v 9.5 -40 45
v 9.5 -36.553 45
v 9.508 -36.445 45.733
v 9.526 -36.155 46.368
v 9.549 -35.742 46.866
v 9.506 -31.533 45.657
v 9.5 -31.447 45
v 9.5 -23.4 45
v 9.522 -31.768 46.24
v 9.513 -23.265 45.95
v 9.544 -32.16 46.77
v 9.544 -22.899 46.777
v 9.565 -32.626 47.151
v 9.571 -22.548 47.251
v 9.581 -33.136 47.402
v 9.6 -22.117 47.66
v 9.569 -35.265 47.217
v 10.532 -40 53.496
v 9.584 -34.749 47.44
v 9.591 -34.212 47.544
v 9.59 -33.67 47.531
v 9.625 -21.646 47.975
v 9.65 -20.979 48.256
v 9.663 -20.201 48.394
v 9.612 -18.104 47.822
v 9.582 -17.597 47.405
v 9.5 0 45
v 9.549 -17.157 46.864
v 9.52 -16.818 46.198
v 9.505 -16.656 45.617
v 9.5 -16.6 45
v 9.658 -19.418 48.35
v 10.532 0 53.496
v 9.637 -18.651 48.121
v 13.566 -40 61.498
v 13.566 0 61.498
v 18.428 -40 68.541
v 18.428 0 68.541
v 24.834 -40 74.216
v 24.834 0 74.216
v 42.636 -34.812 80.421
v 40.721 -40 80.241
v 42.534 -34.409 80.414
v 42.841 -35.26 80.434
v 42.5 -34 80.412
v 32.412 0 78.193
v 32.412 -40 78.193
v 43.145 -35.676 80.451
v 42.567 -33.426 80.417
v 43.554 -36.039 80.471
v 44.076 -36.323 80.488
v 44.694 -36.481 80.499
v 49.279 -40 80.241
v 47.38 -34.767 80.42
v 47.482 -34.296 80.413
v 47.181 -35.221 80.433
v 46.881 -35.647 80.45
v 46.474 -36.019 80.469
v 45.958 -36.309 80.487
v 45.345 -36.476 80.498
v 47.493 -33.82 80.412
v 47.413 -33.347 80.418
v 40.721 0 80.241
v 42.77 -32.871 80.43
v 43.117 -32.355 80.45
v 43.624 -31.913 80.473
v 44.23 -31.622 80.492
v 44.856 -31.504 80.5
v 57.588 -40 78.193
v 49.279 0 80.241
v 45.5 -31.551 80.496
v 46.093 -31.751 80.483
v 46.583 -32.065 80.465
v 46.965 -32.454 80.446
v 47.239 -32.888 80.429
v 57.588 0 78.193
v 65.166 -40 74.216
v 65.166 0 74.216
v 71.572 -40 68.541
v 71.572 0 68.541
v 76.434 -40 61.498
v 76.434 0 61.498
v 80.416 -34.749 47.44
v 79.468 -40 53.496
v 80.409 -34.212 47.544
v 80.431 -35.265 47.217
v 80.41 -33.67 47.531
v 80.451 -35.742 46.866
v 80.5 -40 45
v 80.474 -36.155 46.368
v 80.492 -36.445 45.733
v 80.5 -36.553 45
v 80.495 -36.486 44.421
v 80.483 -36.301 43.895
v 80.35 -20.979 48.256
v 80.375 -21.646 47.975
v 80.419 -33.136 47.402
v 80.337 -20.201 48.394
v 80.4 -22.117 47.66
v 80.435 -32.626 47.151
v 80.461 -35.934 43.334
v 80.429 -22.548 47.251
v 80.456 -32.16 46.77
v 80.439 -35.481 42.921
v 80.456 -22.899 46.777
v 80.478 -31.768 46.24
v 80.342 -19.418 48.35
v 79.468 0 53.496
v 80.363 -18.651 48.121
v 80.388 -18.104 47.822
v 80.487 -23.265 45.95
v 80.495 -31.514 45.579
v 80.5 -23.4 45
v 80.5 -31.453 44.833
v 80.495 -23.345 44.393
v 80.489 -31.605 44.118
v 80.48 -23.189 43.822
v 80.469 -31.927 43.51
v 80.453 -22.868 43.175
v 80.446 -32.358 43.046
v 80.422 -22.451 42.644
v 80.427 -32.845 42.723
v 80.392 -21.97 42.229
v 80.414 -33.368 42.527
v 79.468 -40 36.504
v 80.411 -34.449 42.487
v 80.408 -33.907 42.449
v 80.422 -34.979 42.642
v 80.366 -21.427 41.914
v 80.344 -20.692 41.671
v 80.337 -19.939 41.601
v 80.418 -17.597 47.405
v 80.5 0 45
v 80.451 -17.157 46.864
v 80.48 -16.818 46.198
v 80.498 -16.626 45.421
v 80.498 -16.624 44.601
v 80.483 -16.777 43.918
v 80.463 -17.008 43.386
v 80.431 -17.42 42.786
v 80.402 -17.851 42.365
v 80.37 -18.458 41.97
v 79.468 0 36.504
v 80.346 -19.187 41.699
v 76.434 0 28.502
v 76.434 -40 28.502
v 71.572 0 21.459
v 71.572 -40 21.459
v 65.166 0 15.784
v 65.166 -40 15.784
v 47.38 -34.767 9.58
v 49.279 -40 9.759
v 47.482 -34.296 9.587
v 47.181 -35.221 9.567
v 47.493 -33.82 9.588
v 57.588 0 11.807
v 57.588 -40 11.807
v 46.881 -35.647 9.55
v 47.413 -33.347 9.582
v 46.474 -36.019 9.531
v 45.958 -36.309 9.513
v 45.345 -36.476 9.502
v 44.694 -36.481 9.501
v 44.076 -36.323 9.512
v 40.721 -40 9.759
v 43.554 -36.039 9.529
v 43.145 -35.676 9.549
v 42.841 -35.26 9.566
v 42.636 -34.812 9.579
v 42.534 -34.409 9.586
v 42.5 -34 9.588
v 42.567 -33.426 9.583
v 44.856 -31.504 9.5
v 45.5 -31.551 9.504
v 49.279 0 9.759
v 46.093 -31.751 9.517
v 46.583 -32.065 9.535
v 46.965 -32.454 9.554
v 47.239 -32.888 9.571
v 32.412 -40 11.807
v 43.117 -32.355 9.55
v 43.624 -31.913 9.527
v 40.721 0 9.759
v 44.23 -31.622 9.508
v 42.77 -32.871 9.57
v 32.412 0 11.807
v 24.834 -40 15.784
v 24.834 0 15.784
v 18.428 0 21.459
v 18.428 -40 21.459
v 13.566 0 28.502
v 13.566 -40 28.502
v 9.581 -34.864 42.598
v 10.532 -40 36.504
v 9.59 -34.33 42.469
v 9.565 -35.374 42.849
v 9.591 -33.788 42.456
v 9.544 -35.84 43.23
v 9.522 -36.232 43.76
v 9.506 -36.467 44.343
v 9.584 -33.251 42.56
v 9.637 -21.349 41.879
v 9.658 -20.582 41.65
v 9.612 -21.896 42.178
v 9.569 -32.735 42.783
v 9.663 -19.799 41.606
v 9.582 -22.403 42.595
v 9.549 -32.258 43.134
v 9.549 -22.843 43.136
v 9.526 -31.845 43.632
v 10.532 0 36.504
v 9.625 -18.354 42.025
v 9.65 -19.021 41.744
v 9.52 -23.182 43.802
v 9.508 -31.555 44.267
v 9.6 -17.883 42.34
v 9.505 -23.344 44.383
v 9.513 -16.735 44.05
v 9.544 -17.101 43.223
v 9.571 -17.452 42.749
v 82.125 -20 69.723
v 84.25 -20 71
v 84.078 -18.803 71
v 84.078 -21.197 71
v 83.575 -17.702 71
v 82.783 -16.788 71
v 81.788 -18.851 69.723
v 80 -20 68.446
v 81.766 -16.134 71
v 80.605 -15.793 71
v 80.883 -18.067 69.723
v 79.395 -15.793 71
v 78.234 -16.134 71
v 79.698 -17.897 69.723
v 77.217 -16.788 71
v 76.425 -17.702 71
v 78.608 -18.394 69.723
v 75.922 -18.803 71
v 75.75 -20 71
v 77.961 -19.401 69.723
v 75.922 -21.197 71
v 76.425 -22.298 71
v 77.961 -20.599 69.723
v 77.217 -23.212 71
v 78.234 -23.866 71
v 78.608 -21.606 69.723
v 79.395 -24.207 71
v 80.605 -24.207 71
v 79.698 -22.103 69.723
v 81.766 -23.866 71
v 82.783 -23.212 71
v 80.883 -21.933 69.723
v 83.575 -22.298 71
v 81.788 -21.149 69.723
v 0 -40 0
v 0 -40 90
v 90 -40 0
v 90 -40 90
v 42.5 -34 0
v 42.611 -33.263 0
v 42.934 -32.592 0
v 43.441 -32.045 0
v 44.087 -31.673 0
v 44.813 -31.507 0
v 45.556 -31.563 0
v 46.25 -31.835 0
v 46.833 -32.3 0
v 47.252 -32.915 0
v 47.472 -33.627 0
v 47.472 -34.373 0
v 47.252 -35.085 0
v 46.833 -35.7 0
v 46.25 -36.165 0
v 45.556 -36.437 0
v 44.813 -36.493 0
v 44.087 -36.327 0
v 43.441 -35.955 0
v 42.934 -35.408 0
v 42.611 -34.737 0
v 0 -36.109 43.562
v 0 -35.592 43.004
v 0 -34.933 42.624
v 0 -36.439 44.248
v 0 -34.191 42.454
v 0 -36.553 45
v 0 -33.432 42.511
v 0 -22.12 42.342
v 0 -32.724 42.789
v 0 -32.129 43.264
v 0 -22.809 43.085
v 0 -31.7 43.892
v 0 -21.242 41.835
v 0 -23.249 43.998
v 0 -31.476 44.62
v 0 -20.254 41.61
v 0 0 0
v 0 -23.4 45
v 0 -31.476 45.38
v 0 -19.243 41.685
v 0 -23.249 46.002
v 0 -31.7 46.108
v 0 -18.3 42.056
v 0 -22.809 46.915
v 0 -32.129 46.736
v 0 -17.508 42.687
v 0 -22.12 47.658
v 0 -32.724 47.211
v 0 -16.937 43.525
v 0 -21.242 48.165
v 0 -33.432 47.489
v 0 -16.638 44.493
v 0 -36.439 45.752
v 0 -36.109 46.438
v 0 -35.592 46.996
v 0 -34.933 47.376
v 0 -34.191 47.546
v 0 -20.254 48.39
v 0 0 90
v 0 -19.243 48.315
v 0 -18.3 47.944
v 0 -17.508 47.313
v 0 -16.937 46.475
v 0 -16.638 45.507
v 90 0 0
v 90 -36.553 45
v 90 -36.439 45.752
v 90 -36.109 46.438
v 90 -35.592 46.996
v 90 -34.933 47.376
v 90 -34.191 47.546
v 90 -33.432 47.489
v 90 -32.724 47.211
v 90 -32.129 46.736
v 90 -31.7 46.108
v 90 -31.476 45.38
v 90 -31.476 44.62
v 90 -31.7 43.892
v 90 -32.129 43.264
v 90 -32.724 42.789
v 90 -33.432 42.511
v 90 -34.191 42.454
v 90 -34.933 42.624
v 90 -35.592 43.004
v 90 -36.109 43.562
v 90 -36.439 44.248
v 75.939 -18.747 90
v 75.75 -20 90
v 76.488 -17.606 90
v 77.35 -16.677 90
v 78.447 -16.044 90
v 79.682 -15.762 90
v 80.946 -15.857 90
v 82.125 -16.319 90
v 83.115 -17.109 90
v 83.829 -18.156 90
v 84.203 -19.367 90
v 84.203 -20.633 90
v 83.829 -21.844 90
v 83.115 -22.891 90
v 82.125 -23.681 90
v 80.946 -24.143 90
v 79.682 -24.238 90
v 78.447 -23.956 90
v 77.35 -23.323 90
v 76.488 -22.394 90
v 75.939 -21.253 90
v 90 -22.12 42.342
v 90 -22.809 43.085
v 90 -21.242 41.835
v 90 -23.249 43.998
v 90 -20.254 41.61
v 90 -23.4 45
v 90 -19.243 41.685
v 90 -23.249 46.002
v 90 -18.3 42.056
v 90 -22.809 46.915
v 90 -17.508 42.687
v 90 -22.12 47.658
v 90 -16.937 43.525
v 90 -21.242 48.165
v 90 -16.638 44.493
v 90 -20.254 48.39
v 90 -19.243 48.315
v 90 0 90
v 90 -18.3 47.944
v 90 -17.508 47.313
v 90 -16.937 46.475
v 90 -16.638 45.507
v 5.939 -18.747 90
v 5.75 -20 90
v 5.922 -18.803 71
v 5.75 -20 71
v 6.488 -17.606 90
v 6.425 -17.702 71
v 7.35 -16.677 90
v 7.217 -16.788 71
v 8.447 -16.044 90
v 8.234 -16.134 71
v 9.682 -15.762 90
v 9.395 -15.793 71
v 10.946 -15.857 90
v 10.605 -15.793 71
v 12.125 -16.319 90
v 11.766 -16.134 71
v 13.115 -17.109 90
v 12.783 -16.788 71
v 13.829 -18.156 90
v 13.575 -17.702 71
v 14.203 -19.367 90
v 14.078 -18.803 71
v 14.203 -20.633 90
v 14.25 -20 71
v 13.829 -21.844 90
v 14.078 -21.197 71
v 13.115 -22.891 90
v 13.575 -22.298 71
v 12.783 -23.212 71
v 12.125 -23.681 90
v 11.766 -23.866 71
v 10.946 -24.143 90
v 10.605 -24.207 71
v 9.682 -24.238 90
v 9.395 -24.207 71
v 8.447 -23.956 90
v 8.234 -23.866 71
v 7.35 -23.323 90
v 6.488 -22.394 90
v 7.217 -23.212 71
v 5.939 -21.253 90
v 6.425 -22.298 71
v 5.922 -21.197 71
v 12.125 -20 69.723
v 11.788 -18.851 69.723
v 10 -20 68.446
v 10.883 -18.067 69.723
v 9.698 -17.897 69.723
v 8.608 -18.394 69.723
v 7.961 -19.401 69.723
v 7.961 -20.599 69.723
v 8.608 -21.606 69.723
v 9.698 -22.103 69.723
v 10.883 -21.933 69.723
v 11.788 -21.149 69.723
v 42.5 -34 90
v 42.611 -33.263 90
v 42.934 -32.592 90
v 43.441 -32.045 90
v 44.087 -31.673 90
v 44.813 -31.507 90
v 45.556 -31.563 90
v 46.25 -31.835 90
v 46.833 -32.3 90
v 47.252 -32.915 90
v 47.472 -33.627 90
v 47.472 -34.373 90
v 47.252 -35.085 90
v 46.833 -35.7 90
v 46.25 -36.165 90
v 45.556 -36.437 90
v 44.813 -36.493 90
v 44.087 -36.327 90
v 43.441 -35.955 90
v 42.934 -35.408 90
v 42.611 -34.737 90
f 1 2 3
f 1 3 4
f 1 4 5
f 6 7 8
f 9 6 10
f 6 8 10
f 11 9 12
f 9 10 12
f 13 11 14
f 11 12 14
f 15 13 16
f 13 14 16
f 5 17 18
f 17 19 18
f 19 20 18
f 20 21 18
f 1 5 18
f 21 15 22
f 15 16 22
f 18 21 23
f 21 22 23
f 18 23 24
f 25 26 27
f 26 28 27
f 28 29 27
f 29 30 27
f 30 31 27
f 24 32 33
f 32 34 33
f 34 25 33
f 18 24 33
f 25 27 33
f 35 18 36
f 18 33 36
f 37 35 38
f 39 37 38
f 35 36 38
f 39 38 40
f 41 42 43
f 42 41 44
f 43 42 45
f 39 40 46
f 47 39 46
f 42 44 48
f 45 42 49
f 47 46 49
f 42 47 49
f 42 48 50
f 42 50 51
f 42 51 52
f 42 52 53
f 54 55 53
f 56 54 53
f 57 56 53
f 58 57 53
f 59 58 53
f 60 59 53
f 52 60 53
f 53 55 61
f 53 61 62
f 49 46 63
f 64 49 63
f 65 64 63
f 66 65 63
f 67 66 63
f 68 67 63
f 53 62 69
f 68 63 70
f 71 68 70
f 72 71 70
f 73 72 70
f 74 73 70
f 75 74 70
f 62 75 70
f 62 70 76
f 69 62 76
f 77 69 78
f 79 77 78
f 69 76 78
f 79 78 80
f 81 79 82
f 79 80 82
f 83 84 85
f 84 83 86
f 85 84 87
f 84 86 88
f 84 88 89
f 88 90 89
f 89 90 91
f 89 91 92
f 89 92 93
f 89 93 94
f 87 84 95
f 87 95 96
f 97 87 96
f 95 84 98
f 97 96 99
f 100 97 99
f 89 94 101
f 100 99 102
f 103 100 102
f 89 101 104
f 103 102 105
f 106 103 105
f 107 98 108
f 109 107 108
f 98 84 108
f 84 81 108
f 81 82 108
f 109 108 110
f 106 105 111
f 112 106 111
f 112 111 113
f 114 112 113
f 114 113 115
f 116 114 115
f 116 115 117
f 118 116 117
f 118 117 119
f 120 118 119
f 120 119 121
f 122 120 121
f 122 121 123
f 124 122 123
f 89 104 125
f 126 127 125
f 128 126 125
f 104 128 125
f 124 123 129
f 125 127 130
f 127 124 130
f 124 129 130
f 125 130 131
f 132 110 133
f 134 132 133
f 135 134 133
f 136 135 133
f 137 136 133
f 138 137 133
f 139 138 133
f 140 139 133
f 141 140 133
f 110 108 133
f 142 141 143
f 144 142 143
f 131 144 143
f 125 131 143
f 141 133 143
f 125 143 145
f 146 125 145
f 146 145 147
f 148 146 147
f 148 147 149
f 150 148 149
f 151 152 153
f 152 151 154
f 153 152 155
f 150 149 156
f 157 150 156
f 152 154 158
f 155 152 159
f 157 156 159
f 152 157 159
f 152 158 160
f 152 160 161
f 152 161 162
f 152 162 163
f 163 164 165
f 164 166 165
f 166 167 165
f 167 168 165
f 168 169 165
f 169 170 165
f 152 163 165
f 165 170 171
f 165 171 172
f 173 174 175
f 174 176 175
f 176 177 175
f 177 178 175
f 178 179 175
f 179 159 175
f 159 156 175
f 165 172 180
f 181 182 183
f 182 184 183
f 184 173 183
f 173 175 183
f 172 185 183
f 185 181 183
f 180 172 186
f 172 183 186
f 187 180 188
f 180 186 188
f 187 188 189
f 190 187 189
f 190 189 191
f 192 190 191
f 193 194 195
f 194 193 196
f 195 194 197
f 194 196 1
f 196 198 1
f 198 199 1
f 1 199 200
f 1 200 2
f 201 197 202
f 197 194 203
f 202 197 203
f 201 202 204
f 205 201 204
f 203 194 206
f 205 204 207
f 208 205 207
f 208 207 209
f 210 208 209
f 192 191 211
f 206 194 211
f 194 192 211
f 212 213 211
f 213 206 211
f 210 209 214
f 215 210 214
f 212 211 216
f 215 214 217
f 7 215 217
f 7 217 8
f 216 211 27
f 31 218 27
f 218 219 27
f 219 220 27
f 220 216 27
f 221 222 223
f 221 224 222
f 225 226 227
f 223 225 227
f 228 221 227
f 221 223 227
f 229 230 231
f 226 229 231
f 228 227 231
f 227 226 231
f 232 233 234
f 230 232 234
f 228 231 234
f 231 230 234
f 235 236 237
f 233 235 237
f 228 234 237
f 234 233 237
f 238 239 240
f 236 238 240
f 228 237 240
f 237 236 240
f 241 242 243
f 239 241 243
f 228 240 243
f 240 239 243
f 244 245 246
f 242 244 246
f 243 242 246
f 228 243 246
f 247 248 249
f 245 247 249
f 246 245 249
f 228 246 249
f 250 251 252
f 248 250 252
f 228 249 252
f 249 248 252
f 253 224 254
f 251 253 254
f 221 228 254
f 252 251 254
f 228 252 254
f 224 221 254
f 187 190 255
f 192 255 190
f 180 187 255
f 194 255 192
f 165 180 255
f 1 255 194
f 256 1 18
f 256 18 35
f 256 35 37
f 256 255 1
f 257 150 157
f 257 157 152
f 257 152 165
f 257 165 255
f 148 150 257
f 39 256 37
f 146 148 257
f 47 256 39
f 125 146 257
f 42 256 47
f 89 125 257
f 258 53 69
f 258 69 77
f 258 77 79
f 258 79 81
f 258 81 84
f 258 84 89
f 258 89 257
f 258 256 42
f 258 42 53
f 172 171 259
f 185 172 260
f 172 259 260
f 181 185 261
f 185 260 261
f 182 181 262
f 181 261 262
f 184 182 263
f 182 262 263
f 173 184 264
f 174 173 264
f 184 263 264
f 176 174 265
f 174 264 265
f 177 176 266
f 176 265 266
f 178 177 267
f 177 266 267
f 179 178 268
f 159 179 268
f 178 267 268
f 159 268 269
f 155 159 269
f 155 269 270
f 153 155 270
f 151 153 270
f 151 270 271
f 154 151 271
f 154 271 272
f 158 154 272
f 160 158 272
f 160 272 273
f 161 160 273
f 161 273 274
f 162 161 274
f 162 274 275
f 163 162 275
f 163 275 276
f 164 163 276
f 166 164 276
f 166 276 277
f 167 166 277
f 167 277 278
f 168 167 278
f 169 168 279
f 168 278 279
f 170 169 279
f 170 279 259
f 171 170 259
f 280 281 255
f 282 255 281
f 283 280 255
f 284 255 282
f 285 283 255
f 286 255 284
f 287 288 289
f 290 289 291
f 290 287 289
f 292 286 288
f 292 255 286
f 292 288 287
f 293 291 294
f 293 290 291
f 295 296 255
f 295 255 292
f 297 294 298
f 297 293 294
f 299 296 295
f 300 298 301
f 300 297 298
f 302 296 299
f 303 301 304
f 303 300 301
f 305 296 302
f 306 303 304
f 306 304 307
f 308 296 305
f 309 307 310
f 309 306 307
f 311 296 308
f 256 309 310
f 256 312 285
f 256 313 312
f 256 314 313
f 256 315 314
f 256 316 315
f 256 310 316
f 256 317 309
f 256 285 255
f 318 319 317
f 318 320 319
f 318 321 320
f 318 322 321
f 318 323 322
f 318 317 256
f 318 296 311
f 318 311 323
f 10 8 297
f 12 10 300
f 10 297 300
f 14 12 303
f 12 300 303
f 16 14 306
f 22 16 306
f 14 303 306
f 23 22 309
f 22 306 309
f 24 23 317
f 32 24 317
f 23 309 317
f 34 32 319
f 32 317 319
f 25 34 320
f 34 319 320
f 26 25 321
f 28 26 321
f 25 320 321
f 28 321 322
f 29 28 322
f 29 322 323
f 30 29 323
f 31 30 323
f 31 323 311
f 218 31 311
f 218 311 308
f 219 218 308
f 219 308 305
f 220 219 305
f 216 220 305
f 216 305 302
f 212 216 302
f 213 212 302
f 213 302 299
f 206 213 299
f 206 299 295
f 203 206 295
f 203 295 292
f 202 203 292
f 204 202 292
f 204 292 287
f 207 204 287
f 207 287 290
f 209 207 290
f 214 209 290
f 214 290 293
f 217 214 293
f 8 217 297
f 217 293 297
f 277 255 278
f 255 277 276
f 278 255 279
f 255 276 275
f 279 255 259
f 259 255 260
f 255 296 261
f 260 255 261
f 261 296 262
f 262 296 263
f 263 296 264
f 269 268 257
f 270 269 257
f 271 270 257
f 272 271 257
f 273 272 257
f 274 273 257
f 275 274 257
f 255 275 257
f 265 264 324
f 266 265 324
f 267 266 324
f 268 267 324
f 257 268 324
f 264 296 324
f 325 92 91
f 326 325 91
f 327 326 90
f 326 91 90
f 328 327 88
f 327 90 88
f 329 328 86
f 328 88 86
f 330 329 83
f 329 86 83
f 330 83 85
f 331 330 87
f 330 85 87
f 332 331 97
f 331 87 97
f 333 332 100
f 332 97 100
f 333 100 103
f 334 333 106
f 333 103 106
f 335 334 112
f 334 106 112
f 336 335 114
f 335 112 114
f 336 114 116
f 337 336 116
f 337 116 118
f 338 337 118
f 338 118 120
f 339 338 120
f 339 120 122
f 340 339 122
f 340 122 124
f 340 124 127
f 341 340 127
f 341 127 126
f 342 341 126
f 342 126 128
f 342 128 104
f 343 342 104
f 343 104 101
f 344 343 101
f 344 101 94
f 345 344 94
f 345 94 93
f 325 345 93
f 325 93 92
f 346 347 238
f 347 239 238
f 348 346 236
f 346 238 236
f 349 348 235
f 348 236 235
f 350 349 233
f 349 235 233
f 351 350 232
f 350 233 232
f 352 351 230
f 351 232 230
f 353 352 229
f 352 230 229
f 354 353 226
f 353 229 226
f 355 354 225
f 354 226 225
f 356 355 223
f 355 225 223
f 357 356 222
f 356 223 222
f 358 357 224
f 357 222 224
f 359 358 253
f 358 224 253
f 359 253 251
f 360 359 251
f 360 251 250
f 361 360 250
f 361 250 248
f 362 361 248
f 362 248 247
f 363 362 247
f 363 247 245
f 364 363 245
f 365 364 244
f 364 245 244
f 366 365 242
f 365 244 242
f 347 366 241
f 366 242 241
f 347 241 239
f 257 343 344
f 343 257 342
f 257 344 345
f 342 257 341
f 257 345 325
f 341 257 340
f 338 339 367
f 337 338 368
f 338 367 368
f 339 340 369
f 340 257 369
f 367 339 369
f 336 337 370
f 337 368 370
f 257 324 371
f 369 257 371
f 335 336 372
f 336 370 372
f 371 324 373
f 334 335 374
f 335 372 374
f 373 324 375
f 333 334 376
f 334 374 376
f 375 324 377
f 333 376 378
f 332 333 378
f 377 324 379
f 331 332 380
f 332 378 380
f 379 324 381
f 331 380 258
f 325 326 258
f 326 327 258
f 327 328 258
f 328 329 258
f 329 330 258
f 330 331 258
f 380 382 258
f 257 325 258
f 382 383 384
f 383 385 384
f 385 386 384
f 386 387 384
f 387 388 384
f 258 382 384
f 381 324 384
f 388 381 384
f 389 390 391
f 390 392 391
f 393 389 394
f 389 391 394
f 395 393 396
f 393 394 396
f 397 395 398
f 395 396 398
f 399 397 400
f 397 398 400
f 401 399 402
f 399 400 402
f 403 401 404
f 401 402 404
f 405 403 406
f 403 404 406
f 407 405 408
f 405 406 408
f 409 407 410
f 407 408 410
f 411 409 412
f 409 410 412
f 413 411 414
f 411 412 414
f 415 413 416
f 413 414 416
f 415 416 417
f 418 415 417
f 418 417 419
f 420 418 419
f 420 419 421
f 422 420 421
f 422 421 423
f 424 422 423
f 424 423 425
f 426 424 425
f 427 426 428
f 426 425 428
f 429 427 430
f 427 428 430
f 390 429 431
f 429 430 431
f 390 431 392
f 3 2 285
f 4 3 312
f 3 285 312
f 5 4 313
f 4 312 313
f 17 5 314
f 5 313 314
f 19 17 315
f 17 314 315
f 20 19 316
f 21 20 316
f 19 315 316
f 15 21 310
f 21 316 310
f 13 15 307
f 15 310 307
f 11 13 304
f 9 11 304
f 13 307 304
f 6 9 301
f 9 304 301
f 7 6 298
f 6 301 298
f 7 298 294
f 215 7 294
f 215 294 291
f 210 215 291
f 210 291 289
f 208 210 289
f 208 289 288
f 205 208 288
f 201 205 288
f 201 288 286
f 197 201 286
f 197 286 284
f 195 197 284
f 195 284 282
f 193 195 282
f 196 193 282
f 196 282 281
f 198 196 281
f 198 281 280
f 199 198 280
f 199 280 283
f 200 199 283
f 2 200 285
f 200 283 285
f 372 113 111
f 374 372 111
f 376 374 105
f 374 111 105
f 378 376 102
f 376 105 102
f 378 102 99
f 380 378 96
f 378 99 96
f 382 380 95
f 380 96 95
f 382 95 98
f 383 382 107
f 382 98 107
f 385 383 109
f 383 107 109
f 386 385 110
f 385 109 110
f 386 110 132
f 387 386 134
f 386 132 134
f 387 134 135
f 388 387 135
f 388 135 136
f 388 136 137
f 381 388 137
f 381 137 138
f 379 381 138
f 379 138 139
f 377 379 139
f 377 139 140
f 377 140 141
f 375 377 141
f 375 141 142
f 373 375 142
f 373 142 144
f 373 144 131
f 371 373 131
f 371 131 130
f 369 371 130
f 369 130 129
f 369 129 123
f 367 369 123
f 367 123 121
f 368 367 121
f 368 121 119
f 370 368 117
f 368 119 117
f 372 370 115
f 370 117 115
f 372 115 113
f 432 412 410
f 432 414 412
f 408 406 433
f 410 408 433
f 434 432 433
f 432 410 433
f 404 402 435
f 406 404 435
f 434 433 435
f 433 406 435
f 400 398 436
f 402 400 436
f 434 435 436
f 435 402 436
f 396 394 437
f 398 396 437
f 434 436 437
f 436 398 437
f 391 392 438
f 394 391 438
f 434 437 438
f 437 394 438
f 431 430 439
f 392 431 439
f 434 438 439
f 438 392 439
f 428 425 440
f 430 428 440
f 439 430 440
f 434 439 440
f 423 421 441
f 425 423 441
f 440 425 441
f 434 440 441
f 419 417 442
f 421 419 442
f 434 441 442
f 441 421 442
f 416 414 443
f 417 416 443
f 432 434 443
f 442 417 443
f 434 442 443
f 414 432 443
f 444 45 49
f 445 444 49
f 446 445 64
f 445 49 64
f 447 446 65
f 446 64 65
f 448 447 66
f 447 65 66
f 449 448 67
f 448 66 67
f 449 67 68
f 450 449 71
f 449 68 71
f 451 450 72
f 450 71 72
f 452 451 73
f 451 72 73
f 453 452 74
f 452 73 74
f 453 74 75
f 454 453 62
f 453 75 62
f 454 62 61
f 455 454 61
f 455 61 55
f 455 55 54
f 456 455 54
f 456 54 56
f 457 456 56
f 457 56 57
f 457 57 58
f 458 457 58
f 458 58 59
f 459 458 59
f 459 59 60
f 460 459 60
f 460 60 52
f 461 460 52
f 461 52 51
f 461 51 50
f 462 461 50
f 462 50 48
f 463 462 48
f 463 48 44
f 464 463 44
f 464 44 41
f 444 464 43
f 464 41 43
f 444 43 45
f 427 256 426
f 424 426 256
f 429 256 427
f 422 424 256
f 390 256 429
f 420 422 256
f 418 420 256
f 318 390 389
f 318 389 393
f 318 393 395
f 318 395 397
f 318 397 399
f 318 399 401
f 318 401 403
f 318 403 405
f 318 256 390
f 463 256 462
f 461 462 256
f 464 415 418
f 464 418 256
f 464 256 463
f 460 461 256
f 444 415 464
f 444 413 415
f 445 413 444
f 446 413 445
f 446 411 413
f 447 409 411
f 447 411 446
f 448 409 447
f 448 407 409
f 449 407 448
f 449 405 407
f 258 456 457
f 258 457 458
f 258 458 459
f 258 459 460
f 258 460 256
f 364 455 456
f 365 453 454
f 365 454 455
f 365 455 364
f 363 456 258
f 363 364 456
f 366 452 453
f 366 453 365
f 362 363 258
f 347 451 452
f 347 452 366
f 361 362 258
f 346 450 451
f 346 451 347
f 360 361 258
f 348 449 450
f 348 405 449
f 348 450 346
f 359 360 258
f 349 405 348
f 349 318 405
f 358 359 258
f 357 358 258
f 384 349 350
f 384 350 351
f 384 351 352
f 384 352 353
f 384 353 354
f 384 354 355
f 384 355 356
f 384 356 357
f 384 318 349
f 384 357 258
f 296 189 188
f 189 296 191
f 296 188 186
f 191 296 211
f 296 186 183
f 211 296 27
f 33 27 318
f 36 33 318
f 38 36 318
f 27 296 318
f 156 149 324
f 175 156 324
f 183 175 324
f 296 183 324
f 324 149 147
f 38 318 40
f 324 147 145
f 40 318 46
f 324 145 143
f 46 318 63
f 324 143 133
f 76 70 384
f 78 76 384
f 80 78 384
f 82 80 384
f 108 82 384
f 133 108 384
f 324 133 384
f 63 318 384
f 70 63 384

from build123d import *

# Parameters (mm, degrees)
F0_W      = 90
F0_H      = 90
F1_DEPTH  = 40
F3_D      = 71
F5_D      = 5.1054
F6_D      = 6.8
F8_D      = 5
F10_D     = 8.5
F10_DEPTH = 19
F10_TIP   = 2.5536576309


# Not quite as in the source:
# - a feature names something its author has since deleted; it is built from what else it names


with BuildPart() as f1:
    # F0 (on Front) → F1 (new body)
    with BuildSketch(Plane.XZ):
        with Locations((45, 45)):
            Rectangle(F0_W, F0_H)
    extrude(amount=F1_DEPTH)

    # F3 (through all)
    with Locations(Plane.XZ.offset(40)):
        with Locations((45, 45)):
            Hole(F3_D / 2)

    # F5 (through all)
    with Locations(Plane.YZ.offset(90)):
        with Locations((-34, 45)):
            Hole(F5_D / 2)

    # F6 (through all)
    with Locations(Plane.YZ.offset(90)):
        with Locations((-20, 45)):
            Hole(F6_D / 2)

    # F8 (through all)
    with Locations(Plane.XY.offset(90)):
        with Locations((45, -34)):
            Hole(F8_D / 2)

    # F10
    with Locations(Plane.XY.offset(90)):
        with Locations((10, -20), (80, -20)):
            Hole(F10_D / 2, depth=F10_DEPTH)
            with Locations((0, 0, -(F10_DEPTH + F10_TIP / 2))):  # 118° drill point
                Cone(0, F10_D / 2, F10_TIP, mode=Mode.SUBTRACT)


solid = f1.part
